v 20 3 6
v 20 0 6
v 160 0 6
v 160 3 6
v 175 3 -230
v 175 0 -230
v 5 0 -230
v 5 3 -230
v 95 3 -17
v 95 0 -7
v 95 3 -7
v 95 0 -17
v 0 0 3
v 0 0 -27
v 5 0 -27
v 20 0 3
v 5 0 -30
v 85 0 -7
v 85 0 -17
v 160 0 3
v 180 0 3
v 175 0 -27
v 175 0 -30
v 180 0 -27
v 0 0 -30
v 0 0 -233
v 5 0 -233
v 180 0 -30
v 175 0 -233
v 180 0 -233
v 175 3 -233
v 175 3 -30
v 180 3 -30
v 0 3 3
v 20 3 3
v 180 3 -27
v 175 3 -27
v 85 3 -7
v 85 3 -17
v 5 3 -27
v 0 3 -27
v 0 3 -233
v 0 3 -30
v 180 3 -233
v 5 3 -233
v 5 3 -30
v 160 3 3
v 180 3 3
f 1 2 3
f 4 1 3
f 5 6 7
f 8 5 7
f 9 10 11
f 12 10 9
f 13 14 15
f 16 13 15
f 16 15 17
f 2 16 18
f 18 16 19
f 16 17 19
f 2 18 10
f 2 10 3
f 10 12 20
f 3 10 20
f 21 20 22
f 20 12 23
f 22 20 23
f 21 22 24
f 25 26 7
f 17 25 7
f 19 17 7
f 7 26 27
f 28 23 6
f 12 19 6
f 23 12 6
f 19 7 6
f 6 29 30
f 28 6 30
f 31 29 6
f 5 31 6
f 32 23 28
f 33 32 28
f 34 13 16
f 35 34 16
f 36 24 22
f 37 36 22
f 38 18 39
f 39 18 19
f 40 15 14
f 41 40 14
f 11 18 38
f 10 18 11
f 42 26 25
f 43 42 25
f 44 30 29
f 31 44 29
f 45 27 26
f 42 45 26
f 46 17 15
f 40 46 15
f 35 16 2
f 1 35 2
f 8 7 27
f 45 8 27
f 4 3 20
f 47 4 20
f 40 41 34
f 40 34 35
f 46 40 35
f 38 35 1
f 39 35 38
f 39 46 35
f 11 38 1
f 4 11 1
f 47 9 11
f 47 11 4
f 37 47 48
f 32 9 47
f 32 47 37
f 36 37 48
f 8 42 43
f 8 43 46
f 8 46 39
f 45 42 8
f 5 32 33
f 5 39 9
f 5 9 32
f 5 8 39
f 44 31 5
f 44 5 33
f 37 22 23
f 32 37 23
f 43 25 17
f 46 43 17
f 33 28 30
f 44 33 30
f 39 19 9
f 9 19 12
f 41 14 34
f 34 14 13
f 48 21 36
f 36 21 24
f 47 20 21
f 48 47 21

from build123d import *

# Parameters (mm, degrees)
SKETCH_1_W      = 10
SKETCH_1_H      = 10
EXTRUDE_1_DEPTH = 3


with BuildPart() as part:
    # 草图1 → 凸台-拉伸1 (new body)
    with BuildSketch(Plane(origin=(0, 0, 0), x_dir=(1, 0, 0), z_dir=(0, 1, 0))):
        Polygon((160, -3), (180, -3), (180, 0), (180, 27), (175, 27), (175, 30), (180, 30), (180, 230), (180, 233), (175, 233), (175, 230), (5, 230), (5, 233), (0, 233), (0, 230), (0, 30), (5, 30), (5, 27), (0, 27), (0, 0), (0, -3), (20, -3), (20, -6), (160, -6), align=None)
        with Locations((90, 12)):
            Rectangle(SKETCH_1_W, SKETCH_1_H, mode=Mode.SUBTRACT)
    extrude(amount=EXTRUDE_1_DEPTH)


solid = part.part
